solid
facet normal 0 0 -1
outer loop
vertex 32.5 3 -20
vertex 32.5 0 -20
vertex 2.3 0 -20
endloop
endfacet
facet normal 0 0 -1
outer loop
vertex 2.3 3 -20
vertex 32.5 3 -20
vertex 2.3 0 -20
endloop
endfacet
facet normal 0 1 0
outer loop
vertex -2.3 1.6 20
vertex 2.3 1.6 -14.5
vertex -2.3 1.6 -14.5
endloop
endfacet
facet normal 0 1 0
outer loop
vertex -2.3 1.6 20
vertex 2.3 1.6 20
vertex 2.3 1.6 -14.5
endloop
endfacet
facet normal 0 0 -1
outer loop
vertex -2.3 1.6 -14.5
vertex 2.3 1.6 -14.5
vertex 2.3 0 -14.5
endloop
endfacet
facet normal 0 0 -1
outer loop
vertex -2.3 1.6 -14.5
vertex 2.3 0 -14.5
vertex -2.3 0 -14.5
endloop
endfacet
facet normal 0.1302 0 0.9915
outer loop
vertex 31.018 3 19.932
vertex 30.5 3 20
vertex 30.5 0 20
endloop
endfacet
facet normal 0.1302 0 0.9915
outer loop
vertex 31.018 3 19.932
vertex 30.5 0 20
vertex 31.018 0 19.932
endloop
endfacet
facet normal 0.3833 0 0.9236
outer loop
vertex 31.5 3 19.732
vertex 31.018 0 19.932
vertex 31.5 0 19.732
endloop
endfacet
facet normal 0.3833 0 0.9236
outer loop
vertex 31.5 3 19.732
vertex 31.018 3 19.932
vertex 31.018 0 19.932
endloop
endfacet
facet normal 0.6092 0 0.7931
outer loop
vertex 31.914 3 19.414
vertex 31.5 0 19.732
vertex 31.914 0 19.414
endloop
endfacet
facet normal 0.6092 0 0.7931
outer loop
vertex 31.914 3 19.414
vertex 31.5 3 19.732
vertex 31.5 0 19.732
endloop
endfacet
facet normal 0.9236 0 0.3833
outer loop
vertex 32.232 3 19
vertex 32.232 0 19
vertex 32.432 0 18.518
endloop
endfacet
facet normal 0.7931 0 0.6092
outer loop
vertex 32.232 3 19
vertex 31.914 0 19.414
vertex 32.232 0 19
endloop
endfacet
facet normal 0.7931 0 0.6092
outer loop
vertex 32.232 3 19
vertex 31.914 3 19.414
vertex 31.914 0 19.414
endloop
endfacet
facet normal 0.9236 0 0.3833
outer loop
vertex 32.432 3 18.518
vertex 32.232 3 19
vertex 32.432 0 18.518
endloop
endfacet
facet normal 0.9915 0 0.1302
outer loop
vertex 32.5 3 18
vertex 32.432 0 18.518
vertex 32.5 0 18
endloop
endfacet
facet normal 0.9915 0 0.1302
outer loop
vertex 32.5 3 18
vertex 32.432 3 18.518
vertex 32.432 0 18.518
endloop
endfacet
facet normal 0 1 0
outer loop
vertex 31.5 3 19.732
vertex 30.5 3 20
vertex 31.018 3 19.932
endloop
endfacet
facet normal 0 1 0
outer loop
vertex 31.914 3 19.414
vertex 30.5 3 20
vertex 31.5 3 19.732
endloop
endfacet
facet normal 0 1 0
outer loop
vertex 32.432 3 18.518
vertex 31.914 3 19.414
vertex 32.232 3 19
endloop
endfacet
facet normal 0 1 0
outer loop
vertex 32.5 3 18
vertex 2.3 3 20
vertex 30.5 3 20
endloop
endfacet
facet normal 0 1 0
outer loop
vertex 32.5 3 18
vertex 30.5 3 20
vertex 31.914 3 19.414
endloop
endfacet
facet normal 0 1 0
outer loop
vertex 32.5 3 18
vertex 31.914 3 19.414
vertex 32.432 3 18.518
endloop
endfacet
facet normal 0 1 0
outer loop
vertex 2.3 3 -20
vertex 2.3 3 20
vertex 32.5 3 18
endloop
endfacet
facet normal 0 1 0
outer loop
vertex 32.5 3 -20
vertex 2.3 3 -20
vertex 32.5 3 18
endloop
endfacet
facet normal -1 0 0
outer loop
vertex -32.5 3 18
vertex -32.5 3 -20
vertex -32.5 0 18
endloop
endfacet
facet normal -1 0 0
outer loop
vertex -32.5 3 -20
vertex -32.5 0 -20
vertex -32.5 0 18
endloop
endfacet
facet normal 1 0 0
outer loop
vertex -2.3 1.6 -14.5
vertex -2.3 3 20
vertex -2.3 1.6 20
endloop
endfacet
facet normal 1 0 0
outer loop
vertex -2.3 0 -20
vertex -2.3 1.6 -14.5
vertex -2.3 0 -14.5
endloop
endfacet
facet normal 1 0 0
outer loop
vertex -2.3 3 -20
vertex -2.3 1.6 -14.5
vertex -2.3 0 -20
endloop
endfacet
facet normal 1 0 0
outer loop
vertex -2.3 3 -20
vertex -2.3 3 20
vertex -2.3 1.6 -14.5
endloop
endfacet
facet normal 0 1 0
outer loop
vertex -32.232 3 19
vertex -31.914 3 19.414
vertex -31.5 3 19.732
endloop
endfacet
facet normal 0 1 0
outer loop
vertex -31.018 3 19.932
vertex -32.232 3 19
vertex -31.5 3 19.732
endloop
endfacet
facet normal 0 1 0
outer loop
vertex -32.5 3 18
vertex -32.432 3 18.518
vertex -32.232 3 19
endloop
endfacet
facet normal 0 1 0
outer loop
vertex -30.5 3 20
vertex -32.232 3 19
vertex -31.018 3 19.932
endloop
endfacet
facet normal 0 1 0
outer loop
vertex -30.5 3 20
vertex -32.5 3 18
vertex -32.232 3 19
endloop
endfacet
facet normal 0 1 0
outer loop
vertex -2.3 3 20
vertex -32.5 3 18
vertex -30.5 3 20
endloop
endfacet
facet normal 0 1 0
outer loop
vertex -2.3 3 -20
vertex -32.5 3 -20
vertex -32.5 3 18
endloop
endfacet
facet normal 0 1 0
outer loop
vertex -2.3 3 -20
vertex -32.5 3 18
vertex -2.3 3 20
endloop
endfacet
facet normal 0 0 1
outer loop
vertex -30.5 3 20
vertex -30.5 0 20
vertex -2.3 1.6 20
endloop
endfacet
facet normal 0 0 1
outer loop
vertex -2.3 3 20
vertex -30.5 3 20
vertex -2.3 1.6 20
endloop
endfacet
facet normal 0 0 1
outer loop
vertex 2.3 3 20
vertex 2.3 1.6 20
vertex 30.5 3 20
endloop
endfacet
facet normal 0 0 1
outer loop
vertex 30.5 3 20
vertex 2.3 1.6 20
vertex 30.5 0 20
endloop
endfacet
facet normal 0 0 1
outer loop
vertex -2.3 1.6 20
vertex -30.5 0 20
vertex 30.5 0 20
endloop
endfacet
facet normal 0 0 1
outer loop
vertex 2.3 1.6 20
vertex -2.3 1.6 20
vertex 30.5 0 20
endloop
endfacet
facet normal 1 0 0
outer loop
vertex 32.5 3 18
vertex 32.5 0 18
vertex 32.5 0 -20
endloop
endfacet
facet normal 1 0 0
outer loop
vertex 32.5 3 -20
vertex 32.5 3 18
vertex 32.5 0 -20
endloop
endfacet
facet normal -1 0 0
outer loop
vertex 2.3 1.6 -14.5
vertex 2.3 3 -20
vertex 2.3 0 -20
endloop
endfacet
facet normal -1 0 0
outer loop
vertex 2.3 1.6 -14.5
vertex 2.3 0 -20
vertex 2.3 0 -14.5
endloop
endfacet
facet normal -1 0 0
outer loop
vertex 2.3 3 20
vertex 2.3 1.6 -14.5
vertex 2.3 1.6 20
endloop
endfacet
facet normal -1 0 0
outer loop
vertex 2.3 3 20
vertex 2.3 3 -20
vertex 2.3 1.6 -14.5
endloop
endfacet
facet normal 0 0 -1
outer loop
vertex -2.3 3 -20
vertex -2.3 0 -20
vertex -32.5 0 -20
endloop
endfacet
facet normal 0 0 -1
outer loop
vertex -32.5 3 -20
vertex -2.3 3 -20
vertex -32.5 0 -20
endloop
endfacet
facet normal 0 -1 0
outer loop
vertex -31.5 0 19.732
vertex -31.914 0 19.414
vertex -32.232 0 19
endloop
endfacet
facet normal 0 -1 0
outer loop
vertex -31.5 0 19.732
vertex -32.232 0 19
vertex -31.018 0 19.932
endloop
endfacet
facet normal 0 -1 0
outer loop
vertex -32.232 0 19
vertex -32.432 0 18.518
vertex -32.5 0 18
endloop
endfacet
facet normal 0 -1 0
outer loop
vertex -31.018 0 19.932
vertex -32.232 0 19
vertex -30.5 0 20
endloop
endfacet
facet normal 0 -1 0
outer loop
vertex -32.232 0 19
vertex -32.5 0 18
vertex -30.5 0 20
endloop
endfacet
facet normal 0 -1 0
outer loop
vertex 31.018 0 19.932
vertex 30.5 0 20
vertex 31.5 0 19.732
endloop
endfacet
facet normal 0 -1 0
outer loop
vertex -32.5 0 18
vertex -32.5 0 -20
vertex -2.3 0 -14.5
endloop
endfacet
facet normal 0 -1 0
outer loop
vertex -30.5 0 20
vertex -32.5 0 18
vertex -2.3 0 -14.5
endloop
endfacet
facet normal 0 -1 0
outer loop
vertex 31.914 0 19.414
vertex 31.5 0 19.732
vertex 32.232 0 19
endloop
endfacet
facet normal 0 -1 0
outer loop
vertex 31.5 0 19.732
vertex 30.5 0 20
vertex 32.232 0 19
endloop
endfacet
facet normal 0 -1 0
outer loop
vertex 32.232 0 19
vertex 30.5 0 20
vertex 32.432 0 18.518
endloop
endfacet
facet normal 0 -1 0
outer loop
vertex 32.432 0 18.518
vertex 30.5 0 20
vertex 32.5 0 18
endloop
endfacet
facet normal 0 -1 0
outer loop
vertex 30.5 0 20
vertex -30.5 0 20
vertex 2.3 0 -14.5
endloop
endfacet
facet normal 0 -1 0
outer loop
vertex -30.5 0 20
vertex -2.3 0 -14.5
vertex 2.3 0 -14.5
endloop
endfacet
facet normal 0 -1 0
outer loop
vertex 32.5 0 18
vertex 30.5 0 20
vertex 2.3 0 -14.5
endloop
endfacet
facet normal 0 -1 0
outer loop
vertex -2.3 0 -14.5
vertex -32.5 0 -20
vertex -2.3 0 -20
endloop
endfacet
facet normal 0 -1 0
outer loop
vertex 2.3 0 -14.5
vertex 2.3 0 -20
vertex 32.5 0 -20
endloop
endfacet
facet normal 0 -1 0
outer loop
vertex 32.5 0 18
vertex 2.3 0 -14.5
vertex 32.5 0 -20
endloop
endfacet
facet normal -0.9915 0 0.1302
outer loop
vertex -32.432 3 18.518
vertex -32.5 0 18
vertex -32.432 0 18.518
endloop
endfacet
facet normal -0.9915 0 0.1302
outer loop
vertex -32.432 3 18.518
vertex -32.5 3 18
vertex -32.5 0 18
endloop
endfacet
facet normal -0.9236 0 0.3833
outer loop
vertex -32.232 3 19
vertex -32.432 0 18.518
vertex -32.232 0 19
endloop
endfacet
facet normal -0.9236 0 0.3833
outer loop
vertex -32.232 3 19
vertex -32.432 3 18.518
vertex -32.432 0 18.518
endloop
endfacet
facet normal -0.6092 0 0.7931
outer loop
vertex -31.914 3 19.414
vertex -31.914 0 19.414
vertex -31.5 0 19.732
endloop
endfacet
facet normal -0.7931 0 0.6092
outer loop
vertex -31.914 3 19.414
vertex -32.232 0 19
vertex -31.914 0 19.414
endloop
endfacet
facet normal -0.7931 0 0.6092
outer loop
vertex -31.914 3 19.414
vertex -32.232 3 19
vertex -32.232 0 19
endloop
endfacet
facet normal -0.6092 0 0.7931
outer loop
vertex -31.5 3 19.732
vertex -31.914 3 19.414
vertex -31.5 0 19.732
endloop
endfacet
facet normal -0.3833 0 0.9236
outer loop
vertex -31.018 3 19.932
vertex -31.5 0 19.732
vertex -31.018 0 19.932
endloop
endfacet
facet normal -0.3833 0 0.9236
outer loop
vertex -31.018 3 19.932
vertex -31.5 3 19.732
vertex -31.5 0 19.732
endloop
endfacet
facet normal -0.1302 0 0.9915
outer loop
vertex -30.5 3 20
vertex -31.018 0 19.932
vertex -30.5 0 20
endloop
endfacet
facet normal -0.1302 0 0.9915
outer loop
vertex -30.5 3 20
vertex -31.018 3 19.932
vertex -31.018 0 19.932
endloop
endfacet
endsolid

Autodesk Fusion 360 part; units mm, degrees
sketch "Skizze1" plane through (0, 0, 0) normal (0, 1, 0) x (1, 0, 0)
  line L0 (32.5, 20) -> (-32.5, 20)
  line L1 (-32.5, 20) -> (-32.5, -20)
  line L2 (-32.5, -20) -> (32.5, -20)
  line L3 (32.5, -20) -> (32.5, 20)
  line L4 (32.5, 20) -> (-32.5, -20) construction
  line L5 (-32.5, 20) -> (32.5, -20) construction
  dimension "d1" = 40
  dimension "d2" = 65
extrude "Extrusion1" add sketch "Skizze1" along normal blind 3
sketch "Skizze2" plane through (0, 3, 0) normal (0, 1, 0) x (-1, 0, 0)
  line L0 (-32.5, 20) -> (-32.5, -20)
  line L1 (-32.5, -20) -> (32.5, -20)
  line L2 (32.5, -20) -> (32.5, 20)
  line L3 (32.5, 20) -> (-32.5, 20)
  line L4 (2.3, -20) -> (-2.3, -20)
  line L5 (-2.3, -20) -> (-2.3, -14.5)
  line L6 (-2.3, -14.5) -> (2.3, -14.5)
  line L7 (2.3, -14.5) -> (2.3, -20)
  line L8 (2.3, -20) -> (-2.3, -14.5) construction
  line L9 (-2.3, -20) -> (2.3, -14.5) construction
  point P0 (0, -17.25)
  dimension "d5" = 4.6
  dimension "d6" = 5.5
extrude "Extrusion2" cut sketch "Skizze2" against normal blind 3 contours L1 L4 L5 L6 L7
sketch "Skizze3" plane through (0, 3, 0) normal (0, 1, 0) x (-1, 0, 0)
  line L0 (2.3, -14.5) -> (2.3, -20)
  line L1 (2.3, -20) -> (32.5, -20)
  line L2 (32.5, -20) -> (32.5, 20)
  line L3 (32.5, 20) -> (-32.5, 20)
  line L4 (-32.5, 20) -> (-32.5, -20)
  line L5 (-32.5, -20) -> (-2.3, -20)
  line L6 (-2.3, -20) -> (-2.3, -14.5)
  line L7 (-2.3, -14.5) -> (2.3, -14.5)
  line L8 (2.3, -14.5) -> (-2.3, -14.5)
  line L9 (-2.3, -14.5) -> (-2.3, 20)
  line L10 (-2.3, 20) -> (2.3, 20)
  line L11 (2.3, 20) -> (2.3, -14.5)
extrude "Extrusion3" cut sketch "Skizze3" against normal blind 1.4 contours L3 L7 L8 L9 L10 L11
fillet "Abrundung1" radius 2 2 edges at (-32.5, 1.5, 20) (32.5, 1.5, 20)
